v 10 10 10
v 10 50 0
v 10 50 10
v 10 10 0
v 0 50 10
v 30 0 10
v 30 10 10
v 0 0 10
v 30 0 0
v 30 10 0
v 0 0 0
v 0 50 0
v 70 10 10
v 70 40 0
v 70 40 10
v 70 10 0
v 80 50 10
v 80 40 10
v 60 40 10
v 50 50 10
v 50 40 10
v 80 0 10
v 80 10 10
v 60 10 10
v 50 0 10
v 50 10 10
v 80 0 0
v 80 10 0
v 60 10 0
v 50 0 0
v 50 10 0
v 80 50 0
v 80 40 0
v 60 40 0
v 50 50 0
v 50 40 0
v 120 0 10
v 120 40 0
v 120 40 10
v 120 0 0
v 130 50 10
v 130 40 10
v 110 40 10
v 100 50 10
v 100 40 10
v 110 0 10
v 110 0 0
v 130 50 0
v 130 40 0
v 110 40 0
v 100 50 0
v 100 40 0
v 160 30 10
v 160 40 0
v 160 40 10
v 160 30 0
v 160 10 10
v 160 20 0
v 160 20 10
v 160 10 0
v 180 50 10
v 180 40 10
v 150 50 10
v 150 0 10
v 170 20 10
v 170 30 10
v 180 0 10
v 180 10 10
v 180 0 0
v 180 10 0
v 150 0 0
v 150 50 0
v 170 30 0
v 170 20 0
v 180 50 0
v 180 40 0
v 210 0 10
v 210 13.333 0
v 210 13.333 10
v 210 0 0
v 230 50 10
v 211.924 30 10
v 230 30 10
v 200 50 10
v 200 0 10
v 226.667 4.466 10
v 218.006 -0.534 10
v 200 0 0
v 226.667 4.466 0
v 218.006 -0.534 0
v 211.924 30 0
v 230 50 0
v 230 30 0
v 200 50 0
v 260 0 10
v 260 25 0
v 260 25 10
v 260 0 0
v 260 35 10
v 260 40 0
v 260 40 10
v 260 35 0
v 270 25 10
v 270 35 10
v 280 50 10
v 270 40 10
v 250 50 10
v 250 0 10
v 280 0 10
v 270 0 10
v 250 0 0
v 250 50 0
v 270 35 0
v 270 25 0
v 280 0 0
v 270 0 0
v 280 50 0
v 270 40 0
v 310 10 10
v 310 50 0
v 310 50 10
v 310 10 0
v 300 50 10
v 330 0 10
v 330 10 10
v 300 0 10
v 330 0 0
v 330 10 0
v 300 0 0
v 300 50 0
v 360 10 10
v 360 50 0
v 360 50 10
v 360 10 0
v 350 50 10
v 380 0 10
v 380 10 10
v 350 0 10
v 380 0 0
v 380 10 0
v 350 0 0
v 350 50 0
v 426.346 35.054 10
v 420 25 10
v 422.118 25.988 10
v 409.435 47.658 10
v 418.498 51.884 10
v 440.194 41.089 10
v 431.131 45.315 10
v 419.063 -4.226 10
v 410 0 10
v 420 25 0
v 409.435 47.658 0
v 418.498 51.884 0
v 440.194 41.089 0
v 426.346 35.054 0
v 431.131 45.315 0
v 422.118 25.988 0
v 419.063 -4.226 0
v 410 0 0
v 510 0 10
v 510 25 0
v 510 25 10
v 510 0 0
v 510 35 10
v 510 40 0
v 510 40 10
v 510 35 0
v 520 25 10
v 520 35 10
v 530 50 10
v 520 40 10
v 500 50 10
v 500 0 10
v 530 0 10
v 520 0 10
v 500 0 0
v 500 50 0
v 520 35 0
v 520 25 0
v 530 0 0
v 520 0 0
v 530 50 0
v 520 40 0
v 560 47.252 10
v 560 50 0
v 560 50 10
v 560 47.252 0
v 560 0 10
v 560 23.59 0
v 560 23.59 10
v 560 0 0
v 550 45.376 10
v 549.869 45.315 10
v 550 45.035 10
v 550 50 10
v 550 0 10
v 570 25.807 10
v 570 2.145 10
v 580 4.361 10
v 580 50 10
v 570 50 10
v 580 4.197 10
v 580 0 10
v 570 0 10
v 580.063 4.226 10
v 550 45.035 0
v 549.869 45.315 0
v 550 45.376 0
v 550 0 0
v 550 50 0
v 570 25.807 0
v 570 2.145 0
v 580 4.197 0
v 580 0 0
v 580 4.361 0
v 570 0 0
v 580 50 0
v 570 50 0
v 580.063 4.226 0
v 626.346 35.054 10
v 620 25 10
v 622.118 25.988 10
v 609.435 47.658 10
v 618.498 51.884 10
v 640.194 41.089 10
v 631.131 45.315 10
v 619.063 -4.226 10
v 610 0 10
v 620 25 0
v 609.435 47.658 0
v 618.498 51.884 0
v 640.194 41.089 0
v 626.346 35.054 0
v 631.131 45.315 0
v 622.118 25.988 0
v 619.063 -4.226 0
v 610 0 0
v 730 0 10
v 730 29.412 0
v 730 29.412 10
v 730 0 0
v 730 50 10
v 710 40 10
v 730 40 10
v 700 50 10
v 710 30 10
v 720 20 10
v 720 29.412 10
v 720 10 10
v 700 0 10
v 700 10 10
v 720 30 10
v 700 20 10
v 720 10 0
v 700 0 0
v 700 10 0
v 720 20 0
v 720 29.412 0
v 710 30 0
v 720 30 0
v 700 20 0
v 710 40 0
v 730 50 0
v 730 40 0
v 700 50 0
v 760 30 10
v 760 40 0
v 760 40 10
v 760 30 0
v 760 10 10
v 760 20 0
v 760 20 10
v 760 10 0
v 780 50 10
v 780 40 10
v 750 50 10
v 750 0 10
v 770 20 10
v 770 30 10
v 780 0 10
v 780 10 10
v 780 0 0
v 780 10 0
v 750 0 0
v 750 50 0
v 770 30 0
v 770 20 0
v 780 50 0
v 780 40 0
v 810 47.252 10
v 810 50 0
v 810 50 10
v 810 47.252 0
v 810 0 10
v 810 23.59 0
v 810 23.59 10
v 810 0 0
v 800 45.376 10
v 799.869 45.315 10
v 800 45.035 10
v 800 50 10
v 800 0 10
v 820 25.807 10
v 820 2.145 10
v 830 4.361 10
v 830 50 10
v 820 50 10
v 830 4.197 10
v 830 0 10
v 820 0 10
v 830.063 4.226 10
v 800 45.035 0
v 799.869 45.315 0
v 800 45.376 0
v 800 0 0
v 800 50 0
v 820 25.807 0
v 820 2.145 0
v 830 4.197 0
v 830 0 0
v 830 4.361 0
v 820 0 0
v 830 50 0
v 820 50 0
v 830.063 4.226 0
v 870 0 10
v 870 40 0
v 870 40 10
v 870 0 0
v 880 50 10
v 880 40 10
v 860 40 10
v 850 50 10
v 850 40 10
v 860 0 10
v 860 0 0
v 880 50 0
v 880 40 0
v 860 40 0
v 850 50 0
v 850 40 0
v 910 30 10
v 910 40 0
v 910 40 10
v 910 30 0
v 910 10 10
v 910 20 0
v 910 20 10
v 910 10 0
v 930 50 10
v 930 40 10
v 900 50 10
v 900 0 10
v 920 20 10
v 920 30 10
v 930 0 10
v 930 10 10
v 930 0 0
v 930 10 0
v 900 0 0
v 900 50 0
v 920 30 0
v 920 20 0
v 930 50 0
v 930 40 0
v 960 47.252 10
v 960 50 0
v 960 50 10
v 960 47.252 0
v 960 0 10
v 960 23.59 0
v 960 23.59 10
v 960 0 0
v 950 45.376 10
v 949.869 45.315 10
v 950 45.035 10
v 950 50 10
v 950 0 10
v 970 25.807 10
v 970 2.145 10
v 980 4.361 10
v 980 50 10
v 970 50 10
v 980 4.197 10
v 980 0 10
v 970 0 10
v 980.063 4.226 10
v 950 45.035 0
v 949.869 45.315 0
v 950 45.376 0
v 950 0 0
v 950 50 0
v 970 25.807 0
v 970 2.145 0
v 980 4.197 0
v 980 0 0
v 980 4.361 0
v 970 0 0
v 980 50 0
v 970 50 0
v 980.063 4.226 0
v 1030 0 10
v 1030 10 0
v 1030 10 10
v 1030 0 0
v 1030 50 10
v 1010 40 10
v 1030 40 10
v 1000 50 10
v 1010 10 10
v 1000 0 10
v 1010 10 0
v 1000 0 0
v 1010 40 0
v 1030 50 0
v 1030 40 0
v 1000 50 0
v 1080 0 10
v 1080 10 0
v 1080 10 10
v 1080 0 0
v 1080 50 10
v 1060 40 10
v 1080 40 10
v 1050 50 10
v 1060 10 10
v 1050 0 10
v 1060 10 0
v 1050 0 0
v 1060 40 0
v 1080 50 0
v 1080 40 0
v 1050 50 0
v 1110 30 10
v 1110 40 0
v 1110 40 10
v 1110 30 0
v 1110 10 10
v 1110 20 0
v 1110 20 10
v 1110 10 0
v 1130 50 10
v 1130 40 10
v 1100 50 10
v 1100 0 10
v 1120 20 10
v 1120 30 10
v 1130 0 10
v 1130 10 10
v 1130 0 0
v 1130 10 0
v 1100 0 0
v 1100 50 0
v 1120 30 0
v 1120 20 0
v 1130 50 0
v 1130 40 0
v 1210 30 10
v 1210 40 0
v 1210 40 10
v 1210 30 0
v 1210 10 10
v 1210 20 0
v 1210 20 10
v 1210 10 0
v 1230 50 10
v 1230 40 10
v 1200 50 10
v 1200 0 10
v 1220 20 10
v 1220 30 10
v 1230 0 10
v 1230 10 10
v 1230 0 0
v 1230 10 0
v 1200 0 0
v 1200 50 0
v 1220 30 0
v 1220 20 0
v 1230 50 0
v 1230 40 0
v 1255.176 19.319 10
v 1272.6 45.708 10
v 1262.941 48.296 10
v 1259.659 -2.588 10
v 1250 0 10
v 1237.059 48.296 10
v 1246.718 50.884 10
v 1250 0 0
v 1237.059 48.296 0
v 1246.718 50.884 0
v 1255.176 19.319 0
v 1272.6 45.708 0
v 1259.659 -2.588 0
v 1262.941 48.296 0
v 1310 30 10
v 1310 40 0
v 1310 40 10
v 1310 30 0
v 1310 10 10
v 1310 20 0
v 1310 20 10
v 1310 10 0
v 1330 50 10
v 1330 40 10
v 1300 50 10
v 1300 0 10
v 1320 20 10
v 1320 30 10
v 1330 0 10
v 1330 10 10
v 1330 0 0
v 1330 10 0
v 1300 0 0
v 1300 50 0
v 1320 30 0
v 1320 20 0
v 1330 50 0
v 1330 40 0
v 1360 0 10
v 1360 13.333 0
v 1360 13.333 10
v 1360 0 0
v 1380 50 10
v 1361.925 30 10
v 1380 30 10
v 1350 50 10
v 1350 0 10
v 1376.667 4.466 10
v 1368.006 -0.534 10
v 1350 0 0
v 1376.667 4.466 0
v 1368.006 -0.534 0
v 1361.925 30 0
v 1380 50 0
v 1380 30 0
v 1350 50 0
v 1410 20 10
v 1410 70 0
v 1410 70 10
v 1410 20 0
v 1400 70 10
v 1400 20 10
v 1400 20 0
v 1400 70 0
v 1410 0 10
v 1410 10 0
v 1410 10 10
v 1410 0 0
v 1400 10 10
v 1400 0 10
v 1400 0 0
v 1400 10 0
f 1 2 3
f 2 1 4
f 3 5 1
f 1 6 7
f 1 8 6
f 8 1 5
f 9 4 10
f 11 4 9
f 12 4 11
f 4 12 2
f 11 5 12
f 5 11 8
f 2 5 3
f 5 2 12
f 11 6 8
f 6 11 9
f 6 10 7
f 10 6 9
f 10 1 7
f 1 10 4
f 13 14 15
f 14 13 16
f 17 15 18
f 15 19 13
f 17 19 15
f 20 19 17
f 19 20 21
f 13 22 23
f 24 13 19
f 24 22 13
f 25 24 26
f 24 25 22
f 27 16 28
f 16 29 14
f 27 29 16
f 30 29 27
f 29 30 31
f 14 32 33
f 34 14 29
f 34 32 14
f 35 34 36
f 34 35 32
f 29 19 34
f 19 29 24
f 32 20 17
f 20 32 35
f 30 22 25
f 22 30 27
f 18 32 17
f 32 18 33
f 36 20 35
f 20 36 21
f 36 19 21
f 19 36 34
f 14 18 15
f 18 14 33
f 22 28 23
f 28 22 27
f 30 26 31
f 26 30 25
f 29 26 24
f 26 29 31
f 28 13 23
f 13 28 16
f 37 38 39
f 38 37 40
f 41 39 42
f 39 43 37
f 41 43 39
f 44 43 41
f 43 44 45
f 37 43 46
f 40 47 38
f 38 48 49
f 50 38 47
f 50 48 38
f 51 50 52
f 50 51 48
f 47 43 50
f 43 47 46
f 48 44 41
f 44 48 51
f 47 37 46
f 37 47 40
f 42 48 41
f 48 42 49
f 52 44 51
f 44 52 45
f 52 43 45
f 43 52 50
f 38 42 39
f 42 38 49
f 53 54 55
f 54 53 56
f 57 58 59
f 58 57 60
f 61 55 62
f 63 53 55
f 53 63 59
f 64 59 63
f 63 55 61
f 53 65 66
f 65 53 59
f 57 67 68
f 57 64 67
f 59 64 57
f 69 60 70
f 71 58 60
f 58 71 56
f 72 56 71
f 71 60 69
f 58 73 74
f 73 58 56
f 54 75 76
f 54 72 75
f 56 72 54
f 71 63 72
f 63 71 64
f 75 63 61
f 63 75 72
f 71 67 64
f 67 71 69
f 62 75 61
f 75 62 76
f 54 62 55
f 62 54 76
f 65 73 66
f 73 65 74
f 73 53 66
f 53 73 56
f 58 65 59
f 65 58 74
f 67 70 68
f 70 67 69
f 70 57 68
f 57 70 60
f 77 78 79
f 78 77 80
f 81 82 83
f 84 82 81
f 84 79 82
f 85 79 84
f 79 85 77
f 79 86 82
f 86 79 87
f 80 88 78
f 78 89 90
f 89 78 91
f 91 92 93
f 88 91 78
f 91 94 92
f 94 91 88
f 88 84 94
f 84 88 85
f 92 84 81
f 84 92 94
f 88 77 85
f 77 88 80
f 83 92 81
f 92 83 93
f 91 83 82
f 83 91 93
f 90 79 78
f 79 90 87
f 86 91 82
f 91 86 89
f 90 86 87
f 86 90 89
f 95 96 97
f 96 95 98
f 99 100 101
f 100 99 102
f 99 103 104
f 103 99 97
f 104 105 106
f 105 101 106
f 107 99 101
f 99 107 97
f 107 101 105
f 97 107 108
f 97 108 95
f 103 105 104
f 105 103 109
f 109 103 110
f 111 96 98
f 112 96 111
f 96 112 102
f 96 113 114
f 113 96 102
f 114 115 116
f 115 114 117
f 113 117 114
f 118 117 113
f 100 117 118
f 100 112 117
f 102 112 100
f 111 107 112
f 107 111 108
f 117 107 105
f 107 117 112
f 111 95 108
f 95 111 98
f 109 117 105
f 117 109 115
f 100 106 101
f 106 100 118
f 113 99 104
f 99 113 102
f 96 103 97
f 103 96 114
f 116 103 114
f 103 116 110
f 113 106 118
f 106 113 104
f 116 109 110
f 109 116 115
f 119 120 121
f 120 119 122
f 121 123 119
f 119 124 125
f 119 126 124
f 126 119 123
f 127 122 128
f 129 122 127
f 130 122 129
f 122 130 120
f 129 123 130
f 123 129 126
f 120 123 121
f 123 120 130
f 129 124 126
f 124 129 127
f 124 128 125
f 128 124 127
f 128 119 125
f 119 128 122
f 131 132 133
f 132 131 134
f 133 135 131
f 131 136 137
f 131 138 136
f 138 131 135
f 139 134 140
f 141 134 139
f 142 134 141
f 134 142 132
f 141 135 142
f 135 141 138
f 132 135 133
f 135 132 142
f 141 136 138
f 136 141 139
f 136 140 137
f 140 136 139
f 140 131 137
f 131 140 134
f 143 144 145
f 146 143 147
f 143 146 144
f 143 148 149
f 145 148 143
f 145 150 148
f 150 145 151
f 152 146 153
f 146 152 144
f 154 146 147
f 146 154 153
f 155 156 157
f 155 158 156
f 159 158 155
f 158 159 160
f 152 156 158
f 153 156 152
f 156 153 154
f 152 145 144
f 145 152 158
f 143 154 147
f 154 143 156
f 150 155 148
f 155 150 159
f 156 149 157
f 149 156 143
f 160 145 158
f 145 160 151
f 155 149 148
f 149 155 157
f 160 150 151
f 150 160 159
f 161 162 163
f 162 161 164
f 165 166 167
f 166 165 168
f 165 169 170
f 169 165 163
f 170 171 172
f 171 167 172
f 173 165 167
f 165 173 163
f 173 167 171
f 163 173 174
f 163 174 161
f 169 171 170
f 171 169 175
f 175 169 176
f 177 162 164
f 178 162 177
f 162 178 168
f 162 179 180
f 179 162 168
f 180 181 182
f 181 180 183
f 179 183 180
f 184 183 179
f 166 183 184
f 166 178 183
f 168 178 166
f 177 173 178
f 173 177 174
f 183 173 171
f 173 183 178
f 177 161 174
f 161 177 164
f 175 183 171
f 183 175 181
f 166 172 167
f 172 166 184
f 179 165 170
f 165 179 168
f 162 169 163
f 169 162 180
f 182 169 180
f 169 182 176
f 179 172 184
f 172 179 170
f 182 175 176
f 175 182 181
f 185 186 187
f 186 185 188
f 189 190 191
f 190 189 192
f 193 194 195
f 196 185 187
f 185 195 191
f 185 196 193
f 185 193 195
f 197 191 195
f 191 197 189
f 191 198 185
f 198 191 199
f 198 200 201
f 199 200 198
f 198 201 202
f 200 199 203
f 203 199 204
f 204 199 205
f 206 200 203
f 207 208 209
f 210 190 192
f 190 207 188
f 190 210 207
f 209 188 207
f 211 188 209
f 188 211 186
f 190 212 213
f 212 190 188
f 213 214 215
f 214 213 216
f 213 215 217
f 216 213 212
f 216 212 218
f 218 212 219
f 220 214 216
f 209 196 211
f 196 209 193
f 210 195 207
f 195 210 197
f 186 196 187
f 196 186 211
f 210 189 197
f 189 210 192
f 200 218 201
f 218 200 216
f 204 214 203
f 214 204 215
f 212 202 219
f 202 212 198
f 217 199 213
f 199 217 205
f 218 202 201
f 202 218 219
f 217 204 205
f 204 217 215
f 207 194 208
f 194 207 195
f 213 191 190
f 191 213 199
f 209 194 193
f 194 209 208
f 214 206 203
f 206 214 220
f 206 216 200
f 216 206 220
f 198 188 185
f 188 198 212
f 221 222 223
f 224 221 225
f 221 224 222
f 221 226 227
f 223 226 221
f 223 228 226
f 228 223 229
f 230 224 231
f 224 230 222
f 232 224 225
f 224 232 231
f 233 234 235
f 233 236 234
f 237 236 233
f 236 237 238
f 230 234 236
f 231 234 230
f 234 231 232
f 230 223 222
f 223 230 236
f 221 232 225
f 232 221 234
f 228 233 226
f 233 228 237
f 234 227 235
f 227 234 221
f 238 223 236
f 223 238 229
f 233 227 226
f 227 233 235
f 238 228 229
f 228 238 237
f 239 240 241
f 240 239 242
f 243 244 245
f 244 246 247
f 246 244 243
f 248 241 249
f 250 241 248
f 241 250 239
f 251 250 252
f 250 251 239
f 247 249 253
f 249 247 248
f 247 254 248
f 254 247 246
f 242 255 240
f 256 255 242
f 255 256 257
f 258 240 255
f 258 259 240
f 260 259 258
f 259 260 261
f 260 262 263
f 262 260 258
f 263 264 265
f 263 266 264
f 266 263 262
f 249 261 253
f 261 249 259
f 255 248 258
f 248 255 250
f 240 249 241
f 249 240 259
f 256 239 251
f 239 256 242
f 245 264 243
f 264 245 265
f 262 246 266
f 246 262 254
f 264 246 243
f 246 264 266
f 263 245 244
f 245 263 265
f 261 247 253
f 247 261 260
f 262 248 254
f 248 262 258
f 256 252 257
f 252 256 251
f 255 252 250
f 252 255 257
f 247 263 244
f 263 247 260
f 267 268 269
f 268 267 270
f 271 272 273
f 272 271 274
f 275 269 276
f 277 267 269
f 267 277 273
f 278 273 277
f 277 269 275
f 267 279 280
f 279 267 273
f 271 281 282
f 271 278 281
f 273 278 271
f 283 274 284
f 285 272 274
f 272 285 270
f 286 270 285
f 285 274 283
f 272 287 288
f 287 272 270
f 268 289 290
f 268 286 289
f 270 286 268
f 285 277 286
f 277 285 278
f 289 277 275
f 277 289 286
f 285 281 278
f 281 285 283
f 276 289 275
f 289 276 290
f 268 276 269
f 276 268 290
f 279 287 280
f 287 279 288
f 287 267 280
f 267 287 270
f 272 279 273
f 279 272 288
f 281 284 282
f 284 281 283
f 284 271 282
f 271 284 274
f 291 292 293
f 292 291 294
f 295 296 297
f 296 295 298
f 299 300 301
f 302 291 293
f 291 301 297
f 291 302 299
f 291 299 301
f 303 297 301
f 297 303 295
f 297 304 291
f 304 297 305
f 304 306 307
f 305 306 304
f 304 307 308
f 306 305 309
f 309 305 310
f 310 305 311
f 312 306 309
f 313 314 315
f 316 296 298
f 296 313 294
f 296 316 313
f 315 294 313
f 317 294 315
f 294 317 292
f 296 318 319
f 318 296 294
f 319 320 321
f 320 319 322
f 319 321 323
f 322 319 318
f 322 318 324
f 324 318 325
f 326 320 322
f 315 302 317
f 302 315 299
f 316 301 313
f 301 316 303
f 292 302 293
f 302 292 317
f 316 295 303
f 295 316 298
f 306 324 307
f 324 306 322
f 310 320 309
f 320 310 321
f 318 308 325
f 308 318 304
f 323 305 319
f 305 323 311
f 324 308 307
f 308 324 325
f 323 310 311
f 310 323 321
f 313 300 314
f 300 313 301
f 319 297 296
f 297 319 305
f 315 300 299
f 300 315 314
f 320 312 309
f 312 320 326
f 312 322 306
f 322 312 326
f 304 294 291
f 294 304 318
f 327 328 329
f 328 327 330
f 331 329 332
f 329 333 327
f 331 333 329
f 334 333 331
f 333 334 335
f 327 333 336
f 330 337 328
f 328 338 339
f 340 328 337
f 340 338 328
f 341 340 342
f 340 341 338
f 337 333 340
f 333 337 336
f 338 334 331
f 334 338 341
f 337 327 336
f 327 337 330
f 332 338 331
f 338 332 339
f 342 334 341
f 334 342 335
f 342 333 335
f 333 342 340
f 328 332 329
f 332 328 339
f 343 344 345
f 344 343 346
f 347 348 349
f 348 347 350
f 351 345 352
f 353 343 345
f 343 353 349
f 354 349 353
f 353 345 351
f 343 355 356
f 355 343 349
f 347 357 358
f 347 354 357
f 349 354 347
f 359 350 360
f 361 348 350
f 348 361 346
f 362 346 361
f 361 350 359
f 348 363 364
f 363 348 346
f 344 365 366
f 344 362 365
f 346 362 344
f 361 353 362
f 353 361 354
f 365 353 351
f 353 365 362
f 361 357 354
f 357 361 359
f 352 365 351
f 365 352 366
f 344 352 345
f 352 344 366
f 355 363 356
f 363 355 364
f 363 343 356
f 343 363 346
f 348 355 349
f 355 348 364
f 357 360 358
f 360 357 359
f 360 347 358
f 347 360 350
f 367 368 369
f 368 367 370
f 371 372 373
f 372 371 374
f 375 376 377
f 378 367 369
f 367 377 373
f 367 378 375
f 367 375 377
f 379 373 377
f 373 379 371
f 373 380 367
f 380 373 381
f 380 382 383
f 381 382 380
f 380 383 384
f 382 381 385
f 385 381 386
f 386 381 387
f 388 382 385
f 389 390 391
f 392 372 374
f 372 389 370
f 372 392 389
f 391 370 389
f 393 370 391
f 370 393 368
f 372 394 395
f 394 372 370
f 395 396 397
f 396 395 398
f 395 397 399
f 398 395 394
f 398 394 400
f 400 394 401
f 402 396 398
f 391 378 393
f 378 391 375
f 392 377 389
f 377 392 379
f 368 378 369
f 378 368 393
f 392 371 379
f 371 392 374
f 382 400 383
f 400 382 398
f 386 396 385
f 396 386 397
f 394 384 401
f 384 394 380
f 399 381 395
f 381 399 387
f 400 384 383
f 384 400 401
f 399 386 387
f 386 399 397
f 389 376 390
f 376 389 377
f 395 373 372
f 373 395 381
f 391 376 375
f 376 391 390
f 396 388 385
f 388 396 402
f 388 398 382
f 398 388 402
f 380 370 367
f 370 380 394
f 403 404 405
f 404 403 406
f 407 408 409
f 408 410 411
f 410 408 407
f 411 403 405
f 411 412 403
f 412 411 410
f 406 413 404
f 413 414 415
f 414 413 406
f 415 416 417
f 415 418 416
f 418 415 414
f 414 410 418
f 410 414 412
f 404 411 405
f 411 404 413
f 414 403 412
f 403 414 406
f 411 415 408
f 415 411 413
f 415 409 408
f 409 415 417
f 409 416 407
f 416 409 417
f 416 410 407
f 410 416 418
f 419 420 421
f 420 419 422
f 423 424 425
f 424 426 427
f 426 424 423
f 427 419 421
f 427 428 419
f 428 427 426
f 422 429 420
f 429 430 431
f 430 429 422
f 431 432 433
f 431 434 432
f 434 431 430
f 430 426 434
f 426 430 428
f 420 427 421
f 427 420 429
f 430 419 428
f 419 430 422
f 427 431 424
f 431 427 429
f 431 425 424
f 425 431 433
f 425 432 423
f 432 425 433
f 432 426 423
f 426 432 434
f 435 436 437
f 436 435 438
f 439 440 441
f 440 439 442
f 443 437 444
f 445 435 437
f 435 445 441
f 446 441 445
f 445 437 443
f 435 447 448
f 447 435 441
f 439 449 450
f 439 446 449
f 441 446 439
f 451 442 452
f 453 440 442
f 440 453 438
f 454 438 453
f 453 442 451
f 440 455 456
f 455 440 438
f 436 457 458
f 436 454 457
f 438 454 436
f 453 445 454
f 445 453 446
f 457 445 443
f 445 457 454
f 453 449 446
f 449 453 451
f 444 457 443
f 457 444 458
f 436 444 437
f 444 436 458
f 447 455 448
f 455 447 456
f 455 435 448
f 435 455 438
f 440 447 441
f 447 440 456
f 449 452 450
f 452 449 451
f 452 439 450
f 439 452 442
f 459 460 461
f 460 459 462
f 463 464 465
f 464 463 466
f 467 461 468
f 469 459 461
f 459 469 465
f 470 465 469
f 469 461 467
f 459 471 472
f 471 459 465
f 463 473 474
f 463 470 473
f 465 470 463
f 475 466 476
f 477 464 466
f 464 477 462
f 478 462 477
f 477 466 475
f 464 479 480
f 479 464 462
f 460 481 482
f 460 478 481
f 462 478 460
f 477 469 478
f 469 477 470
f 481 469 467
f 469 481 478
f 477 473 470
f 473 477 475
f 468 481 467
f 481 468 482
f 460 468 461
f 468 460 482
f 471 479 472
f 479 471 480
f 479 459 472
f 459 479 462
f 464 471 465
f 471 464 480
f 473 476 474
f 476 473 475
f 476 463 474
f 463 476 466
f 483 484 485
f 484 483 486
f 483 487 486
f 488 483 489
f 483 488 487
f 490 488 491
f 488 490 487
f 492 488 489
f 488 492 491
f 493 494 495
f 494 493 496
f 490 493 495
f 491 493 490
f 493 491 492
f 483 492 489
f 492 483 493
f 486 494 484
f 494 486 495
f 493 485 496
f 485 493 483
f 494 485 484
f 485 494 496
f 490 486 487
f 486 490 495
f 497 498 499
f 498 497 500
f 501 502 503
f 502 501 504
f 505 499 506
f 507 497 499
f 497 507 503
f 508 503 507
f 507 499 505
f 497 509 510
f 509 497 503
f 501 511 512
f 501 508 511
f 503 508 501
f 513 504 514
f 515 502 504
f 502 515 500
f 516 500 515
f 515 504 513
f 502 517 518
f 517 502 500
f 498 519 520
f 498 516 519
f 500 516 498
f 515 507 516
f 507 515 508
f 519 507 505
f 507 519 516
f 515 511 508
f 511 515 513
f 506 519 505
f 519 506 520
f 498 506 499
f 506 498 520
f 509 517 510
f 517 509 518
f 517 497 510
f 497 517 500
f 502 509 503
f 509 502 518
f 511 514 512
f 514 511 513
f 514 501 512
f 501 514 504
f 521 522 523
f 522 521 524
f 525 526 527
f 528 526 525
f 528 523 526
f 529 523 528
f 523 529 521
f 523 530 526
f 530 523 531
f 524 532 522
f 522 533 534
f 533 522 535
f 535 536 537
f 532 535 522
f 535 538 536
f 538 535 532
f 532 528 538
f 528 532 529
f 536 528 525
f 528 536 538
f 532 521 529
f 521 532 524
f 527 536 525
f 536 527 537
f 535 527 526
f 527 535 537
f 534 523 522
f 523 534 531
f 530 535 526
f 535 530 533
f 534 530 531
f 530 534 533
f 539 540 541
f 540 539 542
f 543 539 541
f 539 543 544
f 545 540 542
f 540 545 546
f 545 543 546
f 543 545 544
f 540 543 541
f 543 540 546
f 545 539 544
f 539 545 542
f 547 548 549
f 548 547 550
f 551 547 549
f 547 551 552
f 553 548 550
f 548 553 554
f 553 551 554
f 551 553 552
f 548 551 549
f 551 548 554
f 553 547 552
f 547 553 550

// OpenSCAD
union(){
    translate(v=[0, 0, 0]){
        color("#CC5500"){
            union(){
                cube(size=[10, 50, 10]);
                translate(v=[0, 0, 0]){
                    cube(size=[30, 10, 10]);
                };
            };
        };
    };
    translate(v=[50, 0, 0]){
        color("#CC5500"){
            union(){
                translate(v=[10, 0, 0]){
                    cube(size=[10, 50, 10]);
                };
                translate(v=[0, 40, 0]){
                    cube(size=[30, 10, 10]);
                };
                translate(v=[0, 0, 0]){
                    cube(size=[30, 10, 10]);
                };
            };
        };
    };
    translate(v=[100, 0, 0]){
        color("#CC5500"){
            union(){
                translate(v=[10, 0, 0]){
                    cube(size=[10, 50, 10]);
                };
                translate(v=[0, 40, 0]){
                    cube(size=[30, 10, 10]);
                };
            };
        };
    };
    translate(v=[150, 0, 0]){
        color("#CC5500"){
            union(){
                cube(size=[10, 50, 10]);
                translate(v=[0, 40, 0]){
                    cube(size=[30, 10, 10]);
                };
                translate(v=[0, 20, 0]){
                    cube(size=[20, 10, 10]);
                };
                translate(v=[0, 0, 0]){
                    cube(size=[30, 10, 10]);
                };
            };
        };
    };
    translate(v=[200, 0, 0]){
        color("#CC5500"){
            union(){
                cube(size=[10, 50, 10]);
                translate(v=[10, 30, 0]){
                    cube(size=[20, 20, 10]);
                };
                translate(v=[10, 33.333333333333336, 0]){
                    rotate(a=[0, 0, -150]){
                        cube(size=[10, 33.333333333333336, 10]);
                    };
                };
            };
        };
    };
    translate(v=[250, 0, 0]){
        color("#CC5500"){
            union(){
                cube(size=[10, 50, 10]);
                translate(v=[0, 40, 0]){
                    cube(size=[30, 10, 10]);
                };
                translate(v=[0, 25, 0]){
                    cube(size=[30, 10, 10]);
                };
                translate(v=[20, 0, 0]){
                    cube(size=[10, 50, 10]);
                };
            };
        };
    };
    translate(v=[300, 0, 0]){
        color("#CC5500"){
            union(){
                cube(size=[10, 50, 10]);
                translate(v=[0, 0, 0]){
                    cube(size=[30, 10, 10]);
                };
            };
        };
    };
    translate(v=[350, 0, 0]){
        color("#CC5500"){
            union(){
                cube(size=[10, 50, 10]);
                translate(v=[0, 0, 0]){
                    cube(size=[30, 10, 10]);
                };
            };
        };
    };
    translate(v=[400, 0, 0]){
        color("#CC5500"){
            union(){
                translate(v=[20, 25.0, 0]){
                    rotate(a=[0, 0, 25]){
                        cube(size=[10, 25.0, 10]);
                    };
                };
                translate(v=[10, 0, 0]){
                    rotate(a=[0, 0, -25]){
                        cube(size=[10, 50, 10]);
                    };
                };
            };
        };
    };
    translate(v=[500, 0, 0]){
        color("#CC5500"){
            union(){
                cube(size=[10, 50, 10]);
                translate(v=[0, 40, 0]){
                    cube(size=[30, 10, 10]);
                };
                translate(v=[0, 25, 0]){
                    cube(size=[30, 10, 10]);
                };
                translate(v=[20, 0, 0]){
                    cube(size=[10, 50, 10]);
                };
            };
        };
    };
    translate(v=[550, 0, 0]){
        color("#CC5500"){
            union(){
                cube(size=[10, 50, 10]);
                translate(v=[20, 0, 0]){
                    cube(size=[10, 50, 10]);
                };
                translate(v=[21, 0, 0]){
                    rotate(a=[0, 0, 25]){
                        cube(size=[10, 50, 10]);
                    };
                };
            };
        };
    };
    translate(v=[600, 0, 0]){
        color("#CC5500"){
            union(){
                translate(v=[20, 25.0, 0]){
                    rotate(a=[0, 0, 25]){
                        cube(size=[10, 25.0, 10]);
                    };
                };
                translate(v=[10, 0, 0]){
                    rotate(a=[0, 0, -25]){
                        cube(size=[10, 50, 10]);
                    };
                };
            };
        };
    };
    translate(v=[700, 0, 0]){
        color("#CC5500"){
            union(){
                translate(v=[20, 0, 0]){
                    cube(size=[10, 29.411764705882355, 10]);
                };
                translate(v=[0, 40, 0]){
                    cube(size=[30, 10, 10]);
                };
                translate(v=[0, 20, 0]){
                    cube(size=[20, 10, 10]);
                };
                translate(v=[0, 0, 0]){
                    cube(size=[30, 10, 10]);
                };
                translate(v=[0, 25.0, 0]){
                    cube(size=[10, 25.0, 10]);
                };
            };
        };
    };
    translate(v=[750, 0, 0]){
        color("#CC5500"){
            union(){
                cube(size=[10, 50, 10]);
                translate(v=[0, 40, 0]){
                    cube(size=[30, 10, 10]);
                };
                translate(v=[0, 20, 0]){
                    cube(size=[20, 10, 10]);
                };
                translate(v=[0, 0, 0]){
                    cube(size=[30, 10, 10]);
                };
            };
        };
    };
    translate(v=[800, 0, 0]){
        color("#CC5500"){
            union(){
                cube(size=[10, 50, 10]);
                translate(v=[20, 0, 0]){
                    cube(size=[10, 50, 10]);
                };
                translate(v=[21, 0, 0]){
                    rotate(a=[0, 0, 25]){
                        cube(size=[10, 50, 10]);
                    };
                };
            };
        };
    };
    translate(v=[850, 0, 0]){
        color("#CC5500"){
            union(){
                translate(v=[10, 0, 0]){
                    cube(size=[10, 50, 10]);
                };
                translate(v=[0, 40, 0]){
                    cube(size=[30, 10, 10]);
                };
            };
        };
    };
    translate(v=[900, 0, 0]){
        color("#CC5500"){
            union(){
                cube(size=[10, 50, 10]);
                translate(v=[0, 40, 0]){
                    cube(size=[30, 10, 10]);
                };
                translate(v=[0, 20, 0]){
                    cube(size=[20, 10, 10]);
                };
                translate(v=[0, 0, 0]){
                    cube(size=[30, 10, 10]);
                };
            };
        };
    };
    translate(v=[950, 0, 0]){
        color("#CC5500"){
            union(){
                cube(size=[10, 50, 10]);
                translate(v=[20, 0, 0]){
                    cube(size=[10, 50, 10]);
                };
                translate(v=[21, 0, 0]){
                    rotate(a=[0, 0, 25]){
                        cube(size=[10, 50, 10]);
                    };
                };
            };
        };
    };
    translate(v=[1000, 0, 0]){
        color("#CC5500"){
            union(){
                cube(size=[30, 10, 10]);
                translate(v=[0, 10, 0]){
                    cube(size=[10, 30, 10]);
                };
                translate(v=[0, 40, 0]){
                    cube(size=[30, 10, 10]);
                };
            };
        };
    };
    translate(v=[1050, 0, 0]){
        color("#CC5500"){
            union(){
                cube(size=[30, 10, 10]);
                translate(v=[0, 10, 0]){
                    cube(size=[10, 30, 10]);
                };
                translate(v=[0, 40, 0]){
                    cube(size=[30, 10, 10]);
                };
            };
        };
    };
    translate(v=[1100, 0, 0]){
        color("#CC5500"){
            union(){
                cube(size=[10, 50, 10]);
                translate(v=[0, 40, 0]){
                    cube(size=[30, 10, 10]);
                };
                translate(v=[0, 20, 0]){
                    cube(size=[20, 10, 10]);
                };
                translate(v=[0, 0, 0]){
                    cube(size=[30, 10, 10]);
                };
            };
        };
    };
    translate(v=[1200, 0, 0]){
        color("#CC5500"){
            union(){
                cube(size=[10, 50, 10]);
                translate(v=[0, 40, 0]){
                    cube(size=[30, 10, 10]);
                };
                translate(v=[0, 20, 0]){
                    cube(size=[20, 10, 10]);
                };
                translate(v=[0, 0, 0]){
                    cube(size=[30, 10, 10]);
                };
            };
        };
    };
    translate(v=[1250, 0, 0]){
        color("#CC5500"){
            union(){
                translate(v=[0, 0, 0]){
                    rotate(a=[0, 0, 15]){
                        cube(size=[10, 50, 10]);
                    };
                };
                translate(v=[0, 0, 0]){
                    rotate(a=[0, 0, -15]){
                        cube(size=[10, 50, 10]);
                    };
                };
            };
        };
    };
    translate(v=[1300, 0, 0]){
        color("#CC5500"){
            union(){
                cube(size=[10, 50, 10]);
                translate(v=[0, 40, 0]){
                    cube(size=[30, 10, 10]);
                };
                translate(v=[0, 20, 0]){
                    cube(size=[20, 10, 10]);
                };
                translate(v=[0, 0, 0]){
                    cube(size=[30, 10, 10]);
                };
            };
        };
    };
    translate(v=[1350, 0, 0]){
        color("#CC5500"){
            union(){
                cube(size=[10, 50, 10]);
                translate(v=[10, 30, 0]){
                    cube(size=[20, 20, 10]);
                };
                translate(v=[10, 33.333333333333336, 0]){
                    rotate(a=[0, 0, -150]){
                        cube(size=[10, 33.333333333333336, 10]);
                    };
                };
            };
        };
    };
    translate(v=[1400, 0, 0]){
        color("#CC5500"){
            translate(v=[0, 20, 0]){
                union(){
                    cube(size=[10, 50, 10]);
                    translate(v=[0, -20, 0]){
                        cube(size=[10, 10, 10]);
                    };
                };
            };
        };
    };
};
